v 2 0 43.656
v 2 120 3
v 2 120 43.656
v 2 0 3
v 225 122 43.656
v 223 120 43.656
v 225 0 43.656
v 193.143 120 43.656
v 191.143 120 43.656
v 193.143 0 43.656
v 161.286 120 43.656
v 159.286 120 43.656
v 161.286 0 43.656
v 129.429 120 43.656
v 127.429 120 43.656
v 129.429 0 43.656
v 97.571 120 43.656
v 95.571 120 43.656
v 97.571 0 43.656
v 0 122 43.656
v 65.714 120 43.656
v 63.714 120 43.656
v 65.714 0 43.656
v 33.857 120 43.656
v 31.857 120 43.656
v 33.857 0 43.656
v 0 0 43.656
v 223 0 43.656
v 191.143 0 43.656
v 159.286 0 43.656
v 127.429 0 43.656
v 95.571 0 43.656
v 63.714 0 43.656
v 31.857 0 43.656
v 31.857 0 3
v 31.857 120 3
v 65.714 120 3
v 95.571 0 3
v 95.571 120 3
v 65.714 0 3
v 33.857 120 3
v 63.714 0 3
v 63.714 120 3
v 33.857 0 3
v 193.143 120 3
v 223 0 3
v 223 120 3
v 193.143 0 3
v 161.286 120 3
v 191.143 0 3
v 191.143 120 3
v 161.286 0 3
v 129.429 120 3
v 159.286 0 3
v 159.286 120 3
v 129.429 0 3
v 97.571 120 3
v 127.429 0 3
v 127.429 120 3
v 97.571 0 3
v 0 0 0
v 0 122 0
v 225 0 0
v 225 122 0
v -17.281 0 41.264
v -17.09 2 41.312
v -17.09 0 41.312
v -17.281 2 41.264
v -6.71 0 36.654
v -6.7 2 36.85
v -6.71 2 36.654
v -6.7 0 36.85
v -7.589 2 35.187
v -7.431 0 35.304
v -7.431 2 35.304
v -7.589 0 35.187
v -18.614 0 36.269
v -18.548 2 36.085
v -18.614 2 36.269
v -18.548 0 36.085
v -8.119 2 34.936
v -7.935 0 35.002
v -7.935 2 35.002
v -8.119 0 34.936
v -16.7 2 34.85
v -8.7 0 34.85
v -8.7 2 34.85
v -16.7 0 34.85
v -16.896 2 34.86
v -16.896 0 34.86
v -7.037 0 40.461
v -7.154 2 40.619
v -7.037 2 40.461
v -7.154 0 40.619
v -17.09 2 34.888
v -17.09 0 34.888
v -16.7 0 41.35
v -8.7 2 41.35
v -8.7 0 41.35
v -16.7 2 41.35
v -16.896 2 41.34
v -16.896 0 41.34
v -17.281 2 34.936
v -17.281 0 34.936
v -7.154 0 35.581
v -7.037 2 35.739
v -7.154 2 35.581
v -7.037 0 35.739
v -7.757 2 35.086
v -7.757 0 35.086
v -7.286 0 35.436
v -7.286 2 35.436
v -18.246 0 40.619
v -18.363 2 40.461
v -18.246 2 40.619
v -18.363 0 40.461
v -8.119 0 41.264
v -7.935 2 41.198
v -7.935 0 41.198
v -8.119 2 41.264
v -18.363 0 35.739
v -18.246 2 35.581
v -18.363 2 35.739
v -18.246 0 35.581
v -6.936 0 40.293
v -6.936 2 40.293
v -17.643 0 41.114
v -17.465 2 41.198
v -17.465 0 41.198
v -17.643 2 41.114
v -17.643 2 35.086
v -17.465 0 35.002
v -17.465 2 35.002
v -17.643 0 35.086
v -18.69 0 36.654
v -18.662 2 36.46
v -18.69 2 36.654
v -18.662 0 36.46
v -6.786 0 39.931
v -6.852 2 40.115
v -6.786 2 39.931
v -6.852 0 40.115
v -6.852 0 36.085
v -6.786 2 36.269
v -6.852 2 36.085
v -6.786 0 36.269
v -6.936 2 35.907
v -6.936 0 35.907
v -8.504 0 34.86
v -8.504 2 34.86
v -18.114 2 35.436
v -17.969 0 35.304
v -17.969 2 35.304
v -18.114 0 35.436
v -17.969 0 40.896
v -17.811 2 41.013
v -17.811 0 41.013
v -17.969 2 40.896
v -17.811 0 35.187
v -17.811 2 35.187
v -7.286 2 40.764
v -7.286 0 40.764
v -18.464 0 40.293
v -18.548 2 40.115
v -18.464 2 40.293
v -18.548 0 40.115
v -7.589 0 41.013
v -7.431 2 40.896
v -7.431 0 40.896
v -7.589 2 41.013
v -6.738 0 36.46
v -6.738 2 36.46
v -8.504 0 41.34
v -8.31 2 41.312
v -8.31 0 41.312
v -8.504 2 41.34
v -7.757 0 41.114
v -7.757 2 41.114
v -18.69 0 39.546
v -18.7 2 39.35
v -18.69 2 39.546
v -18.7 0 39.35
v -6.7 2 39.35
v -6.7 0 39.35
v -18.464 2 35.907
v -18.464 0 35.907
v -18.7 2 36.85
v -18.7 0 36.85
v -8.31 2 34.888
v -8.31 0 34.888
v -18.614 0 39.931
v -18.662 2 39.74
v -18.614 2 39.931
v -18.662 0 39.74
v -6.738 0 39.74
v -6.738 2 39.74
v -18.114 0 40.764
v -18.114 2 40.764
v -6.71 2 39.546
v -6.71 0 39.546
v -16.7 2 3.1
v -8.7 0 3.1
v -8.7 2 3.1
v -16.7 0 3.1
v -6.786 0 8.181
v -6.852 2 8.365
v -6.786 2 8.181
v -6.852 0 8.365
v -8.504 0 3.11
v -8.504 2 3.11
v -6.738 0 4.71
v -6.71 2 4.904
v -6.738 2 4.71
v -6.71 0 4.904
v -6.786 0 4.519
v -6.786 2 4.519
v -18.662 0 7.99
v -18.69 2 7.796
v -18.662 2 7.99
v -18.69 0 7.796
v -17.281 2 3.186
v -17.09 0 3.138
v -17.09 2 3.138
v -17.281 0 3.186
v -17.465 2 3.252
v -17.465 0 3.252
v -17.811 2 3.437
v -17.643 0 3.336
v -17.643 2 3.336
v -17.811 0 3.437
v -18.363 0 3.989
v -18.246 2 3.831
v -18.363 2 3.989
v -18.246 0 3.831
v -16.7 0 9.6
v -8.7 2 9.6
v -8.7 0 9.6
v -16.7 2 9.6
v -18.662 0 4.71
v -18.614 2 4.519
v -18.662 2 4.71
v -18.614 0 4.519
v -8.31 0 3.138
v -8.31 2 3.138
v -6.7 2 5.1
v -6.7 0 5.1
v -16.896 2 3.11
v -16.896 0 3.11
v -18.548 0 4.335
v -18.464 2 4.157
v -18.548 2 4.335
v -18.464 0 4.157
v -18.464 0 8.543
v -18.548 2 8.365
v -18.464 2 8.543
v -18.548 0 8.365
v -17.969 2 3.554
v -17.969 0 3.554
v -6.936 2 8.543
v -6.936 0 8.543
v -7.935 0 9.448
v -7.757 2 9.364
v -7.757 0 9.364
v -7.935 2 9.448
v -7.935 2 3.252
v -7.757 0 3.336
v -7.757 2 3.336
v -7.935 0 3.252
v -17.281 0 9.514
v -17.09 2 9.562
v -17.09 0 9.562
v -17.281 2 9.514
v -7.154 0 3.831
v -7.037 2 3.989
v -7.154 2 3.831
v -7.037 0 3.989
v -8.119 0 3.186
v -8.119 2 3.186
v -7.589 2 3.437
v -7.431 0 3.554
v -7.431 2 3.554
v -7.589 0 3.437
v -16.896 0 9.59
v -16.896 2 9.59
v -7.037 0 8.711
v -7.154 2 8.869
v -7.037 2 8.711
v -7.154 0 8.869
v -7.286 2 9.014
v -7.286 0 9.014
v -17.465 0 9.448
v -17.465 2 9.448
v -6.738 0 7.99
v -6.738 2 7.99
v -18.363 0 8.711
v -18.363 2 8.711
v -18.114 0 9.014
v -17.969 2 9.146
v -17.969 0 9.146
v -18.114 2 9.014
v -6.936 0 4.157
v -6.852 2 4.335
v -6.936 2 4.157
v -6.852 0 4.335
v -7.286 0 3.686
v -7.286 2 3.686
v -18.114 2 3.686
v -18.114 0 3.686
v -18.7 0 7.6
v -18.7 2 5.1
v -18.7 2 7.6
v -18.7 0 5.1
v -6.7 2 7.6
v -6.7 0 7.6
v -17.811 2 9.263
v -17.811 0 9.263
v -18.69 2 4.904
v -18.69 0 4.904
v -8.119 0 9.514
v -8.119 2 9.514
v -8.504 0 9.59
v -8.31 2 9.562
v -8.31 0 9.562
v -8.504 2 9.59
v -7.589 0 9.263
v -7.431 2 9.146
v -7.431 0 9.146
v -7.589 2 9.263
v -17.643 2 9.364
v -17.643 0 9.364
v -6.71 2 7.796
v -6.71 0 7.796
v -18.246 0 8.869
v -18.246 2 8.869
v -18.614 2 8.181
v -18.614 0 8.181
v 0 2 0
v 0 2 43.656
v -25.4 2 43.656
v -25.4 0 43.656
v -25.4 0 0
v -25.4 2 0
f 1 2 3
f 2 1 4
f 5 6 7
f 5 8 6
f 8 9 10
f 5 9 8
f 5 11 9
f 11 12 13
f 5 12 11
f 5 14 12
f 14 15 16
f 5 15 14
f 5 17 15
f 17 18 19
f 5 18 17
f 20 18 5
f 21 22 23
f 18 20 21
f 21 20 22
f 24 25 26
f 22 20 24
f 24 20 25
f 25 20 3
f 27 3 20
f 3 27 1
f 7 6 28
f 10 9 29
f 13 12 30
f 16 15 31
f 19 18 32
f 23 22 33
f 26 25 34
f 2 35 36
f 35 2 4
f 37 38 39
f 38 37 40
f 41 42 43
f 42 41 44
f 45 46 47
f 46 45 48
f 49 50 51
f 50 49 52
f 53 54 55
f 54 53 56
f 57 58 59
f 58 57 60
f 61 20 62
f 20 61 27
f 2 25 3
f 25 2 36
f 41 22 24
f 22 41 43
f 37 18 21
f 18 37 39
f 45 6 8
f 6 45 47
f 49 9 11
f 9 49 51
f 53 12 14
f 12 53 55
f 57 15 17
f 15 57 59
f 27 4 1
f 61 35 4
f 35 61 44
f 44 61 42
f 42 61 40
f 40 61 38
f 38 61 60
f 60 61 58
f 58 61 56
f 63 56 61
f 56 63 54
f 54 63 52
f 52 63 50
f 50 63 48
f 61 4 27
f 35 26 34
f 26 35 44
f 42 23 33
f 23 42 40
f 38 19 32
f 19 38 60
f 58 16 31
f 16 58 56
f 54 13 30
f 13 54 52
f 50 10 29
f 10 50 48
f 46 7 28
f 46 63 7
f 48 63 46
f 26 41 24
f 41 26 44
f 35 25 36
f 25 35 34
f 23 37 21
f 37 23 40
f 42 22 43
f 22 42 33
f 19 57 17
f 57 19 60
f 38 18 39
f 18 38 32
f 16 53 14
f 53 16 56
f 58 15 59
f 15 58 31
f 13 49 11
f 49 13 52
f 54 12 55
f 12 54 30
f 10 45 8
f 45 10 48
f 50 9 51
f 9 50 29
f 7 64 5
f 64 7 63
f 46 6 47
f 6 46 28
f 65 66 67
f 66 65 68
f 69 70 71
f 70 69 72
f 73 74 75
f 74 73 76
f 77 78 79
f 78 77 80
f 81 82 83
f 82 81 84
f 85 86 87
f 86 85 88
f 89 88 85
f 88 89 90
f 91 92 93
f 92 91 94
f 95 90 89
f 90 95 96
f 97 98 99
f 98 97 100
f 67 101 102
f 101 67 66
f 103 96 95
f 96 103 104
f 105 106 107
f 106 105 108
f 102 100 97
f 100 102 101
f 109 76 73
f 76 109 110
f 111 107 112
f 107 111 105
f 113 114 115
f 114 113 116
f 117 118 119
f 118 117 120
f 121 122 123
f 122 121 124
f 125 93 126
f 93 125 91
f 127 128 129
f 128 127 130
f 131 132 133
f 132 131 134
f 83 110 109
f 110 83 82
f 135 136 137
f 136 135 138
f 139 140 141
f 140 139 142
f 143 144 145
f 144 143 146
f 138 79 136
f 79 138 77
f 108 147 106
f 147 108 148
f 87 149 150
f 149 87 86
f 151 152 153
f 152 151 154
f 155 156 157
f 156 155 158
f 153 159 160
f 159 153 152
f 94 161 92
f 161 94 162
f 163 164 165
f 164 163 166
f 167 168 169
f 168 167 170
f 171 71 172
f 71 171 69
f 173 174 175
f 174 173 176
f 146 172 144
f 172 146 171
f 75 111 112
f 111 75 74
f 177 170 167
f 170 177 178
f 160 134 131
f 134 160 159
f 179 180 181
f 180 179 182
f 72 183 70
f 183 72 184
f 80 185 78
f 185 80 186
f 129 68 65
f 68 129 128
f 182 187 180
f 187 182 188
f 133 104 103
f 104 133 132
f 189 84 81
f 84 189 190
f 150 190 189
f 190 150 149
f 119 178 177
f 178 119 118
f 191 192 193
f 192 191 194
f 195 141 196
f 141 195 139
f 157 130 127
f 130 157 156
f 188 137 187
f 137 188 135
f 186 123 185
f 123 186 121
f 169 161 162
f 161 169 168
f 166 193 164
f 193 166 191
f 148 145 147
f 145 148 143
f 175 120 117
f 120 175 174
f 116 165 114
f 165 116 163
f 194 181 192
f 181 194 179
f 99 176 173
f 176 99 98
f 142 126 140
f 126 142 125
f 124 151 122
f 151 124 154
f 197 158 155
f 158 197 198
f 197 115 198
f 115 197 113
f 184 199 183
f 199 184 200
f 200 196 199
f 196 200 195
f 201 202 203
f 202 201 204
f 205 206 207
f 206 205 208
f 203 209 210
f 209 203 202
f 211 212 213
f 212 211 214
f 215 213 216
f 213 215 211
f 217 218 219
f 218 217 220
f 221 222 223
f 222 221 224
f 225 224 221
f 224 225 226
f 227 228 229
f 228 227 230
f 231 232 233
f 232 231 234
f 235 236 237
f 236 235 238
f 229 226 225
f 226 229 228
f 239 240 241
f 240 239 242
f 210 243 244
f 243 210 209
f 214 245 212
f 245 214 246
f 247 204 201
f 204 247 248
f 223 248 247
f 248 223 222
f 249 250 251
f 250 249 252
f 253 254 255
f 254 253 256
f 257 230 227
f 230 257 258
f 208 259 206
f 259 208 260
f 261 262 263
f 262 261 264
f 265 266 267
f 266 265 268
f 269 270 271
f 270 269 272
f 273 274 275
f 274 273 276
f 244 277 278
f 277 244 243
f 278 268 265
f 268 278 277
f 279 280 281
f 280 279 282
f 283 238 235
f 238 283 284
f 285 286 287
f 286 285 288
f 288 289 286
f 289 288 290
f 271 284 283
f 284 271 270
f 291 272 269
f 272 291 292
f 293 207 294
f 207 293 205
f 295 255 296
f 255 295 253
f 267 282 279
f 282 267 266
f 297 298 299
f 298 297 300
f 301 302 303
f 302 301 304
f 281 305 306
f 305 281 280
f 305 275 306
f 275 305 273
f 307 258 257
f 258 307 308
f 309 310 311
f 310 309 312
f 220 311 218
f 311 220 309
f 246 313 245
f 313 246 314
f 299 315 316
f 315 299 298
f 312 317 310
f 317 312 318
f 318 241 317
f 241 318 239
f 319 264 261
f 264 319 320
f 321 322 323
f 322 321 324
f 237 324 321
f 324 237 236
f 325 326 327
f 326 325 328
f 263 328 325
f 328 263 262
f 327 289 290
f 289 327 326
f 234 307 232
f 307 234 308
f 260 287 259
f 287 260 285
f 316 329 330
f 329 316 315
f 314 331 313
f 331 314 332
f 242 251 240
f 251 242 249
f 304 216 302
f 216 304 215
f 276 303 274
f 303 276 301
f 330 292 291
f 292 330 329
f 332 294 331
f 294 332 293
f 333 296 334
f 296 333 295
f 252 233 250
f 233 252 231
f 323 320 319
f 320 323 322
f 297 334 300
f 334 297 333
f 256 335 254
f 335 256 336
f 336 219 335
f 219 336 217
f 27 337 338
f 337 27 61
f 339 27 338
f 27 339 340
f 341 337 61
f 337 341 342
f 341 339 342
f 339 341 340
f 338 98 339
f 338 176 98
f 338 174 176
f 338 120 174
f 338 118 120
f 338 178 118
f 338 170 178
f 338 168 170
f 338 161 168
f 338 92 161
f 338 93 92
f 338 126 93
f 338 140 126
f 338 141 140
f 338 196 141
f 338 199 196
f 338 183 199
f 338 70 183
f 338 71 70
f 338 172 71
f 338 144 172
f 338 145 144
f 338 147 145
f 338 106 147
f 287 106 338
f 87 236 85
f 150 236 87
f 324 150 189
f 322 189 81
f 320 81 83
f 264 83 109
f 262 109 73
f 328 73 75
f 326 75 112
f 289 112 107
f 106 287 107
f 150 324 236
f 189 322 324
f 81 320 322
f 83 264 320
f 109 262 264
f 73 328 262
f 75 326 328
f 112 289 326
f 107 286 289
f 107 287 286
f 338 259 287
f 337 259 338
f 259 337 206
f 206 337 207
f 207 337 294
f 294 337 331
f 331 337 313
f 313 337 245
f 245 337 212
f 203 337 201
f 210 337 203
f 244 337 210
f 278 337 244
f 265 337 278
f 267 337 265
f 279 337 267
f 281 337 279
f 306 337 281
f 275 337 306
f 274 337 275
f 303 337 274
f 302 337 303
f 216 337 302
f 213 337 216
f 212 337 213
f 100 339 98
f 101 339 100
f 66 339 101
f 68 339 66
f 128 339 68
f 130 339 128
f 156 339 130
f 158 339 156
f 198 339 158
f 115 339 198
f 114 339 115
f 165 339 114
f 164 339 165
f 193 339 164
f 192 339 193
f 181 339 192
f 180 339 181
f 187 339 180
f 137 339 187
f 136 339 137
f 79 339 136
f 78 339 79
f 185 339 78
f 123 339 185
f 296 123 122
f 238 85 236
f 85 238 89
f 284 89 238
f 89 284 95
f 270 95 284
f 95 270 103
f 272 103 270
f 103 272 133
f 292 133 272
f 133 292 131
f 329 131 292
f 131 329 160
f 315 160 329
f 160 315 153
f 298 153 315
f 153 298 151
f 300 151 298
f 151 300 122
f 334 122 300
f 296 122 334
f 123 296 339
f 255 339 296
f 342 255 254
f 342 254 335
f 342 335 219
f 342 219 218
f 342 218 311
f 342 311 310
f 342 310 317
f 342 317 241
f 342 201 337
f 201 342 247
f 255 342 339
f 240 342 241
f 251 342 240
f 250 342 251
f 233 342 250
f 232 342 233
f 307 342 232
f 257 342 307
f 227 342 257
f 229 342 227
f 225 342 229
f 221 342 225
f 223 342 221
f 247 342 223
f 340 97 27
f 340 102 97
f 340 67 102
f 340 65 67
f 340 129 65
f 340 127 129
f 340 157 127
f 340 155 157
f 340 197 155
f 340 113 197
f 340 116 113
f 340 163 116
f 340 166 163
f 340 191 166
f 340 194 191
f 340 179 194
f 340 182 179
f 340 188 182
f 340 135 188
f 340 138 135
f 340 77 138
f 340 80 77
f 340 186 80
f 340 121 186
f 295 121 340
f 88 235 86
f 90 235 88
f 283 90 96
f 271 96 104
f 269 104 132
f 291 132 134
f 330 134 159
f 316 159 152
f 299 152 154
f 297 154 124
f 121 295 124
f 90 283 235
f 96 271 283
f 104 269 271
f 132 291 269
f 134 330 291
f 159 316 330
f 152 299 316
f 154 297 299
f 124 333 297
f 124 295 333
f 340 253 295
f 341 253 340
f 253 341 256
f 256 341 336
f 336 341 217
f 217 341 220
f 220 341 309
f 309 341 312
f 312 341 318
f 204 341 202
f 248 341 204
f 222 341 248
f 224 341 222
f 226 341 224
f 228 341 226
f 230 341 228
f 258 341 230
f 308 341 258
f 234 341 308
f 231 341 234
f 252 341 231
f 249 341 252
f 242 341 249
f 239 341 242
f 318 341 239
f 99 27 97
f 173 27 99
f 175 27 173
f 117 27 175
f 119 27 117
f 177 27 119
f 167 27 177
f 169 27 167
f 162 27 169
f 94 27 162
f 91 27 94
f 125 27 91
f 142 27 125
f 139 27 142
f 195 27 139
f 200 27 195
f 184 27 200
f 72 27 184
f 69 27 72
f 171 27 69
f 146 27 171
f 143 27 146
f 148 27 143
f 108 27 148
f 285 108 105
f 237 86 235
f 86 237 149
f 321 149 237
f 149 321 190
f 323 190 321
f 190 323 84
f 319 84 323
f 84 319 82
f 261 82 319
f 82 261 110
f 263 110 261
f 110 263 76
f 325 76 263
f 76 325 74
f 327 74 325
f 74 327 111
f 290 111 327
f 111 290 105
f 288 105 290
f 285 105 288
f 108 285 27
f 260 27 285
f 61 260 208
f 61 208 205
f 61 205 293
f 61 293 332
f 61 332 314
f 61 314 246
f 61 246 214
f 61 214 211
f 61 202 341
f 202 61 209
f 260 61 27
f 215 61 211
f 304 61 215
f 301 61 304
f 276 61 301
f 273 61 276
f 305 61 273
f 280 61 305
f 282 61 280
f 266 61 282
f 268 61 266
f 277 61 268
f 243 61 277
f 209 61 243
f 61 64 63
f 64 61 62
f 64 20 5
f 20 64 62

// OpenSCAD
// file: ../scadlib/rack_mount.scad
/* OpenSCAD Utility Library: Rack Mounted Stuff
 * By Michael Stum
 * https://www.stum.de/
 *
 * This work is licensed under a
 * Creative Commons Attribution-ShareAlike 4.0 International License.
 * https://creativecommons.org/licenses/by-sa/4.0/
 */

use <misc.scad>;

function rack_spacing() = 0.794; // ​1⁄32 inch (0.03125 in or 0.794 mm)
function rack_units(units = 1, apply_spacing = false)
    = apply_spacing
        ? (44.45 * units) - rack_spacing()
        : (44.45 * units);
        
module rack_mounting_ear(units = 1, apply_spacing = true, ear_width = 25.4, ear_strength = 2)
{   
    total_height = rack_units(units, apply_spacing);    
    cube(size = [ear_width, ear_strength, total_height], center = false);
}

module rack_mounting_ear_holes(bottom = true, top = true, middle = true, ear_width = inch_to_mm(1), ear_strength = 2)
{    
    // Assuming an M6 Screw/Bolt
    ear_screwhole_width = 12;
    ear_screwhole_height = 6.5;
    ear_screwhole_height_half = ear_screwhole_height/2;
    ear_screwhole_ypos = -(ear_strength/2);
    
    vpos = (ear_width - ear_screwhole_width) / 2;
    top_pos = (rack_units() - ear_screwhole_height) - (inch_to_mm(0.25) - ear_screwhole_height_half);
    middle_pos = rack_units(0.5) - (ear_screwhole_height/2);
    bottom_pos = inch_to_mm(0.25) - ear_screwhole_height_half;
    
    if (top) {
        translate([vpos,ear_screwhole_ypos,top_pos])
          rounded_cube([ear_screwhole_width, ear_strength*2, ear_screwhole_height]);
    }
    
    if (middle) {
        translate([vpos,ear_screwhole_ypos,middle_pos])
          rounded_cube([ear_screwhole_width, ear_strength*2, ear_screwhole_height]);
    }
    
    if (bottom) {
        translate([vpos,ear_screwhole_ypos,bottom_pos])
          rounded_cube([ear_screwhole_width, ear_strength*2, ear_screwhole_height]);
    }
}
// file: ../scadlib/misc.scad
/* OpenSCAD Utility Library
 * By Michael Stum
 * https://www.stum.de/
 *
 * This work is licensed under a
 * Creative Commons Attribution-ShareAlike 4.0 International License.
 * https://creativecommons.org/licenses/by-sa/4.0/
 */

function inch_to_mm(inch) = inch * 25.4;

module rounded_cube(d,r=2) {
    cube_width = d[0]-(r*2);
    cube_height = d[1];
    cube_depth = d[2]-(r*2);
   
    minkowski() {
        translate([r,0,r]) cube([cube_width, cube_height, cube_depth]);
        
        rotate([90,0,0])
          cylinder(r=r,h=cube_depth,center=true, $fn=64);
    }
}
// main file
/* LTO Tape Holder for 19" (Half-)Rack, 1U, 7 Tapes, mirror-able
 * By Michael Stum
 * https://www.stum.de/
 *
 * This work is licensed under a
 * Creative Commons Attribution-ShareAlike 4.0 International License.
 * https://creativecommons.org/licenses/by-sa/4.0/
 */
 
/* Usage Notes:
 * - Actual Height with a tape in it is a bit less than 3U
 * - You should strengthen the mounting ear and horizontal
 *   area with some piece of metal or wood or similar.
 * - LTO Tapes weigh around 250g/8.8oz each (in their cases).
 *   That's 1.75kg for 7 tapes.
 * - Slot width is meant to hold tapes in their protective cases
 * - Slot width should accomodate wider cases
 * - Can hold RDX Cartridges as well, and smaller
 *   tape formats like AIT, DDS, VXA, ...
 * - Not compatible with DLT/SDLT Tapes in their cases,
 *   Slots are slightly too narrow.
 * - All Units are in Millimeters (mm), unless multiplied with
 *   inch_to_mm, at which point they are in inch (in/")
 */
 
 use <../scadlib/misc.scad>
 use <../scadlib/rack_mount.scad>

// Add mounting ears for rack mount? (Set false if put on a desk or if you want to attach your own ear/rail)
add_rack_mount_ear = true;

// Two mirrored pieces (Left and Right) can be combined
// to fill out a 19" Rack. This sets whether we're doing
// the Left (false) or Right (true) side piece
is_right_side_piece = false;

// How thick should the floor be? (mm)
floor_strength = 3;

// Draw Tapes (for visualization, set false for STL export)
draw_tapes = false;

// Draw a mirrored second half for full 19" width (for visualization, set false for STL export)
draw_second_half = false;

// How "smooth" screw holes and other rounded parts are.
$fn = 256;

/********************************************
 * The actual drawing code                  *
 * stuff here isn't meant to be customized, *
 * as it may not work correctly.            */
/********************************************/
num_tapes = 7; // Can't change this, other magic numbers assume this
total_height = rack_units(1, apply_spacing = true);

wall_strength = 2;
back_strength = wall_strength;
ear_strength = wall_strength;

floor_width = 225;
floor_depth = 120;
wall_height = total_height-floor_strength;

/* LTO Tape in one of those annoying wide cases */
tape_width = 29;
tape_depth = 112;
tape_height = 114;

/* Breathing room on the side of each tape, basically whatever is left after subtracting the tape width and wall width */
tape_box_extra_width = (floor_width - (num_tapes * tape_width) - ((num_tapes+1) * wall_strength)) / num_tapes;
tape_box_width = tape_width + tape_box_extra_width;

module half_rack()
{
    // Floor
    color("LightGreen")
      cube(size = [floor_width, floor_depth, floor_strength], center = false);
    
    // Spacer Walls
    for ( i = [0 : num_tapes] ){
        color("DimGray")
        translate([(tape_box_width + wall_strength) * i,0,floor_strength])
          cube(size = [wall_strength, floor_depth, wall_height], center = false);
    }
  
    // Back Wall
    color("Red")
    translate([0,floor_depth,0])
      cube(size = [floor_width, back_strength, total_height], center = false);

    if (add_rack_mount_ear) {
        color("DarkViolet") mounting_ear();
    }

    // Tapes
    if (draw_tapes) {
        for ( i = [0 : num_tapes-1] ){
            tape_position = ((tape_box_width + wall_strength) * i) + wall_strength + (tape_box_extra_width/2);
            
            color("DeepSkyBlue", 0.7)
            translate([tape_position,0,floor_strength+1])
              cube(size = [tape_width, tape_depth, tape_height], center = false);
        }
    }
}

module mounting_ear()
{
    ear_width = inch_to_mm(1);
    
    translate([-ear_width,0,0]) 
    difference() {            
        rack_mounting_ear(units = 1, ear_width = ear_width, ear_strength = ear_strength);
        rack_mounting_ear_holes(bottom = true, top = true, middle = false, ear_width = ear_width, ear_strength = ear_strength);
    }
}

mirror_first = is_right_side_piece ? 1 : 0;
mirror_second = is_right_side_piece ? 0 : 1;
translate_second_multi = is_right_side_piece ? -1 : 1;

mirror([mirror_first,0,0]) half_rack();

if (draw_second_half) {
  translate([(floor_width * 2) * translate_second_multi,0,0])
  mirror([mirror_second,0,0])
    half_rack();
}
